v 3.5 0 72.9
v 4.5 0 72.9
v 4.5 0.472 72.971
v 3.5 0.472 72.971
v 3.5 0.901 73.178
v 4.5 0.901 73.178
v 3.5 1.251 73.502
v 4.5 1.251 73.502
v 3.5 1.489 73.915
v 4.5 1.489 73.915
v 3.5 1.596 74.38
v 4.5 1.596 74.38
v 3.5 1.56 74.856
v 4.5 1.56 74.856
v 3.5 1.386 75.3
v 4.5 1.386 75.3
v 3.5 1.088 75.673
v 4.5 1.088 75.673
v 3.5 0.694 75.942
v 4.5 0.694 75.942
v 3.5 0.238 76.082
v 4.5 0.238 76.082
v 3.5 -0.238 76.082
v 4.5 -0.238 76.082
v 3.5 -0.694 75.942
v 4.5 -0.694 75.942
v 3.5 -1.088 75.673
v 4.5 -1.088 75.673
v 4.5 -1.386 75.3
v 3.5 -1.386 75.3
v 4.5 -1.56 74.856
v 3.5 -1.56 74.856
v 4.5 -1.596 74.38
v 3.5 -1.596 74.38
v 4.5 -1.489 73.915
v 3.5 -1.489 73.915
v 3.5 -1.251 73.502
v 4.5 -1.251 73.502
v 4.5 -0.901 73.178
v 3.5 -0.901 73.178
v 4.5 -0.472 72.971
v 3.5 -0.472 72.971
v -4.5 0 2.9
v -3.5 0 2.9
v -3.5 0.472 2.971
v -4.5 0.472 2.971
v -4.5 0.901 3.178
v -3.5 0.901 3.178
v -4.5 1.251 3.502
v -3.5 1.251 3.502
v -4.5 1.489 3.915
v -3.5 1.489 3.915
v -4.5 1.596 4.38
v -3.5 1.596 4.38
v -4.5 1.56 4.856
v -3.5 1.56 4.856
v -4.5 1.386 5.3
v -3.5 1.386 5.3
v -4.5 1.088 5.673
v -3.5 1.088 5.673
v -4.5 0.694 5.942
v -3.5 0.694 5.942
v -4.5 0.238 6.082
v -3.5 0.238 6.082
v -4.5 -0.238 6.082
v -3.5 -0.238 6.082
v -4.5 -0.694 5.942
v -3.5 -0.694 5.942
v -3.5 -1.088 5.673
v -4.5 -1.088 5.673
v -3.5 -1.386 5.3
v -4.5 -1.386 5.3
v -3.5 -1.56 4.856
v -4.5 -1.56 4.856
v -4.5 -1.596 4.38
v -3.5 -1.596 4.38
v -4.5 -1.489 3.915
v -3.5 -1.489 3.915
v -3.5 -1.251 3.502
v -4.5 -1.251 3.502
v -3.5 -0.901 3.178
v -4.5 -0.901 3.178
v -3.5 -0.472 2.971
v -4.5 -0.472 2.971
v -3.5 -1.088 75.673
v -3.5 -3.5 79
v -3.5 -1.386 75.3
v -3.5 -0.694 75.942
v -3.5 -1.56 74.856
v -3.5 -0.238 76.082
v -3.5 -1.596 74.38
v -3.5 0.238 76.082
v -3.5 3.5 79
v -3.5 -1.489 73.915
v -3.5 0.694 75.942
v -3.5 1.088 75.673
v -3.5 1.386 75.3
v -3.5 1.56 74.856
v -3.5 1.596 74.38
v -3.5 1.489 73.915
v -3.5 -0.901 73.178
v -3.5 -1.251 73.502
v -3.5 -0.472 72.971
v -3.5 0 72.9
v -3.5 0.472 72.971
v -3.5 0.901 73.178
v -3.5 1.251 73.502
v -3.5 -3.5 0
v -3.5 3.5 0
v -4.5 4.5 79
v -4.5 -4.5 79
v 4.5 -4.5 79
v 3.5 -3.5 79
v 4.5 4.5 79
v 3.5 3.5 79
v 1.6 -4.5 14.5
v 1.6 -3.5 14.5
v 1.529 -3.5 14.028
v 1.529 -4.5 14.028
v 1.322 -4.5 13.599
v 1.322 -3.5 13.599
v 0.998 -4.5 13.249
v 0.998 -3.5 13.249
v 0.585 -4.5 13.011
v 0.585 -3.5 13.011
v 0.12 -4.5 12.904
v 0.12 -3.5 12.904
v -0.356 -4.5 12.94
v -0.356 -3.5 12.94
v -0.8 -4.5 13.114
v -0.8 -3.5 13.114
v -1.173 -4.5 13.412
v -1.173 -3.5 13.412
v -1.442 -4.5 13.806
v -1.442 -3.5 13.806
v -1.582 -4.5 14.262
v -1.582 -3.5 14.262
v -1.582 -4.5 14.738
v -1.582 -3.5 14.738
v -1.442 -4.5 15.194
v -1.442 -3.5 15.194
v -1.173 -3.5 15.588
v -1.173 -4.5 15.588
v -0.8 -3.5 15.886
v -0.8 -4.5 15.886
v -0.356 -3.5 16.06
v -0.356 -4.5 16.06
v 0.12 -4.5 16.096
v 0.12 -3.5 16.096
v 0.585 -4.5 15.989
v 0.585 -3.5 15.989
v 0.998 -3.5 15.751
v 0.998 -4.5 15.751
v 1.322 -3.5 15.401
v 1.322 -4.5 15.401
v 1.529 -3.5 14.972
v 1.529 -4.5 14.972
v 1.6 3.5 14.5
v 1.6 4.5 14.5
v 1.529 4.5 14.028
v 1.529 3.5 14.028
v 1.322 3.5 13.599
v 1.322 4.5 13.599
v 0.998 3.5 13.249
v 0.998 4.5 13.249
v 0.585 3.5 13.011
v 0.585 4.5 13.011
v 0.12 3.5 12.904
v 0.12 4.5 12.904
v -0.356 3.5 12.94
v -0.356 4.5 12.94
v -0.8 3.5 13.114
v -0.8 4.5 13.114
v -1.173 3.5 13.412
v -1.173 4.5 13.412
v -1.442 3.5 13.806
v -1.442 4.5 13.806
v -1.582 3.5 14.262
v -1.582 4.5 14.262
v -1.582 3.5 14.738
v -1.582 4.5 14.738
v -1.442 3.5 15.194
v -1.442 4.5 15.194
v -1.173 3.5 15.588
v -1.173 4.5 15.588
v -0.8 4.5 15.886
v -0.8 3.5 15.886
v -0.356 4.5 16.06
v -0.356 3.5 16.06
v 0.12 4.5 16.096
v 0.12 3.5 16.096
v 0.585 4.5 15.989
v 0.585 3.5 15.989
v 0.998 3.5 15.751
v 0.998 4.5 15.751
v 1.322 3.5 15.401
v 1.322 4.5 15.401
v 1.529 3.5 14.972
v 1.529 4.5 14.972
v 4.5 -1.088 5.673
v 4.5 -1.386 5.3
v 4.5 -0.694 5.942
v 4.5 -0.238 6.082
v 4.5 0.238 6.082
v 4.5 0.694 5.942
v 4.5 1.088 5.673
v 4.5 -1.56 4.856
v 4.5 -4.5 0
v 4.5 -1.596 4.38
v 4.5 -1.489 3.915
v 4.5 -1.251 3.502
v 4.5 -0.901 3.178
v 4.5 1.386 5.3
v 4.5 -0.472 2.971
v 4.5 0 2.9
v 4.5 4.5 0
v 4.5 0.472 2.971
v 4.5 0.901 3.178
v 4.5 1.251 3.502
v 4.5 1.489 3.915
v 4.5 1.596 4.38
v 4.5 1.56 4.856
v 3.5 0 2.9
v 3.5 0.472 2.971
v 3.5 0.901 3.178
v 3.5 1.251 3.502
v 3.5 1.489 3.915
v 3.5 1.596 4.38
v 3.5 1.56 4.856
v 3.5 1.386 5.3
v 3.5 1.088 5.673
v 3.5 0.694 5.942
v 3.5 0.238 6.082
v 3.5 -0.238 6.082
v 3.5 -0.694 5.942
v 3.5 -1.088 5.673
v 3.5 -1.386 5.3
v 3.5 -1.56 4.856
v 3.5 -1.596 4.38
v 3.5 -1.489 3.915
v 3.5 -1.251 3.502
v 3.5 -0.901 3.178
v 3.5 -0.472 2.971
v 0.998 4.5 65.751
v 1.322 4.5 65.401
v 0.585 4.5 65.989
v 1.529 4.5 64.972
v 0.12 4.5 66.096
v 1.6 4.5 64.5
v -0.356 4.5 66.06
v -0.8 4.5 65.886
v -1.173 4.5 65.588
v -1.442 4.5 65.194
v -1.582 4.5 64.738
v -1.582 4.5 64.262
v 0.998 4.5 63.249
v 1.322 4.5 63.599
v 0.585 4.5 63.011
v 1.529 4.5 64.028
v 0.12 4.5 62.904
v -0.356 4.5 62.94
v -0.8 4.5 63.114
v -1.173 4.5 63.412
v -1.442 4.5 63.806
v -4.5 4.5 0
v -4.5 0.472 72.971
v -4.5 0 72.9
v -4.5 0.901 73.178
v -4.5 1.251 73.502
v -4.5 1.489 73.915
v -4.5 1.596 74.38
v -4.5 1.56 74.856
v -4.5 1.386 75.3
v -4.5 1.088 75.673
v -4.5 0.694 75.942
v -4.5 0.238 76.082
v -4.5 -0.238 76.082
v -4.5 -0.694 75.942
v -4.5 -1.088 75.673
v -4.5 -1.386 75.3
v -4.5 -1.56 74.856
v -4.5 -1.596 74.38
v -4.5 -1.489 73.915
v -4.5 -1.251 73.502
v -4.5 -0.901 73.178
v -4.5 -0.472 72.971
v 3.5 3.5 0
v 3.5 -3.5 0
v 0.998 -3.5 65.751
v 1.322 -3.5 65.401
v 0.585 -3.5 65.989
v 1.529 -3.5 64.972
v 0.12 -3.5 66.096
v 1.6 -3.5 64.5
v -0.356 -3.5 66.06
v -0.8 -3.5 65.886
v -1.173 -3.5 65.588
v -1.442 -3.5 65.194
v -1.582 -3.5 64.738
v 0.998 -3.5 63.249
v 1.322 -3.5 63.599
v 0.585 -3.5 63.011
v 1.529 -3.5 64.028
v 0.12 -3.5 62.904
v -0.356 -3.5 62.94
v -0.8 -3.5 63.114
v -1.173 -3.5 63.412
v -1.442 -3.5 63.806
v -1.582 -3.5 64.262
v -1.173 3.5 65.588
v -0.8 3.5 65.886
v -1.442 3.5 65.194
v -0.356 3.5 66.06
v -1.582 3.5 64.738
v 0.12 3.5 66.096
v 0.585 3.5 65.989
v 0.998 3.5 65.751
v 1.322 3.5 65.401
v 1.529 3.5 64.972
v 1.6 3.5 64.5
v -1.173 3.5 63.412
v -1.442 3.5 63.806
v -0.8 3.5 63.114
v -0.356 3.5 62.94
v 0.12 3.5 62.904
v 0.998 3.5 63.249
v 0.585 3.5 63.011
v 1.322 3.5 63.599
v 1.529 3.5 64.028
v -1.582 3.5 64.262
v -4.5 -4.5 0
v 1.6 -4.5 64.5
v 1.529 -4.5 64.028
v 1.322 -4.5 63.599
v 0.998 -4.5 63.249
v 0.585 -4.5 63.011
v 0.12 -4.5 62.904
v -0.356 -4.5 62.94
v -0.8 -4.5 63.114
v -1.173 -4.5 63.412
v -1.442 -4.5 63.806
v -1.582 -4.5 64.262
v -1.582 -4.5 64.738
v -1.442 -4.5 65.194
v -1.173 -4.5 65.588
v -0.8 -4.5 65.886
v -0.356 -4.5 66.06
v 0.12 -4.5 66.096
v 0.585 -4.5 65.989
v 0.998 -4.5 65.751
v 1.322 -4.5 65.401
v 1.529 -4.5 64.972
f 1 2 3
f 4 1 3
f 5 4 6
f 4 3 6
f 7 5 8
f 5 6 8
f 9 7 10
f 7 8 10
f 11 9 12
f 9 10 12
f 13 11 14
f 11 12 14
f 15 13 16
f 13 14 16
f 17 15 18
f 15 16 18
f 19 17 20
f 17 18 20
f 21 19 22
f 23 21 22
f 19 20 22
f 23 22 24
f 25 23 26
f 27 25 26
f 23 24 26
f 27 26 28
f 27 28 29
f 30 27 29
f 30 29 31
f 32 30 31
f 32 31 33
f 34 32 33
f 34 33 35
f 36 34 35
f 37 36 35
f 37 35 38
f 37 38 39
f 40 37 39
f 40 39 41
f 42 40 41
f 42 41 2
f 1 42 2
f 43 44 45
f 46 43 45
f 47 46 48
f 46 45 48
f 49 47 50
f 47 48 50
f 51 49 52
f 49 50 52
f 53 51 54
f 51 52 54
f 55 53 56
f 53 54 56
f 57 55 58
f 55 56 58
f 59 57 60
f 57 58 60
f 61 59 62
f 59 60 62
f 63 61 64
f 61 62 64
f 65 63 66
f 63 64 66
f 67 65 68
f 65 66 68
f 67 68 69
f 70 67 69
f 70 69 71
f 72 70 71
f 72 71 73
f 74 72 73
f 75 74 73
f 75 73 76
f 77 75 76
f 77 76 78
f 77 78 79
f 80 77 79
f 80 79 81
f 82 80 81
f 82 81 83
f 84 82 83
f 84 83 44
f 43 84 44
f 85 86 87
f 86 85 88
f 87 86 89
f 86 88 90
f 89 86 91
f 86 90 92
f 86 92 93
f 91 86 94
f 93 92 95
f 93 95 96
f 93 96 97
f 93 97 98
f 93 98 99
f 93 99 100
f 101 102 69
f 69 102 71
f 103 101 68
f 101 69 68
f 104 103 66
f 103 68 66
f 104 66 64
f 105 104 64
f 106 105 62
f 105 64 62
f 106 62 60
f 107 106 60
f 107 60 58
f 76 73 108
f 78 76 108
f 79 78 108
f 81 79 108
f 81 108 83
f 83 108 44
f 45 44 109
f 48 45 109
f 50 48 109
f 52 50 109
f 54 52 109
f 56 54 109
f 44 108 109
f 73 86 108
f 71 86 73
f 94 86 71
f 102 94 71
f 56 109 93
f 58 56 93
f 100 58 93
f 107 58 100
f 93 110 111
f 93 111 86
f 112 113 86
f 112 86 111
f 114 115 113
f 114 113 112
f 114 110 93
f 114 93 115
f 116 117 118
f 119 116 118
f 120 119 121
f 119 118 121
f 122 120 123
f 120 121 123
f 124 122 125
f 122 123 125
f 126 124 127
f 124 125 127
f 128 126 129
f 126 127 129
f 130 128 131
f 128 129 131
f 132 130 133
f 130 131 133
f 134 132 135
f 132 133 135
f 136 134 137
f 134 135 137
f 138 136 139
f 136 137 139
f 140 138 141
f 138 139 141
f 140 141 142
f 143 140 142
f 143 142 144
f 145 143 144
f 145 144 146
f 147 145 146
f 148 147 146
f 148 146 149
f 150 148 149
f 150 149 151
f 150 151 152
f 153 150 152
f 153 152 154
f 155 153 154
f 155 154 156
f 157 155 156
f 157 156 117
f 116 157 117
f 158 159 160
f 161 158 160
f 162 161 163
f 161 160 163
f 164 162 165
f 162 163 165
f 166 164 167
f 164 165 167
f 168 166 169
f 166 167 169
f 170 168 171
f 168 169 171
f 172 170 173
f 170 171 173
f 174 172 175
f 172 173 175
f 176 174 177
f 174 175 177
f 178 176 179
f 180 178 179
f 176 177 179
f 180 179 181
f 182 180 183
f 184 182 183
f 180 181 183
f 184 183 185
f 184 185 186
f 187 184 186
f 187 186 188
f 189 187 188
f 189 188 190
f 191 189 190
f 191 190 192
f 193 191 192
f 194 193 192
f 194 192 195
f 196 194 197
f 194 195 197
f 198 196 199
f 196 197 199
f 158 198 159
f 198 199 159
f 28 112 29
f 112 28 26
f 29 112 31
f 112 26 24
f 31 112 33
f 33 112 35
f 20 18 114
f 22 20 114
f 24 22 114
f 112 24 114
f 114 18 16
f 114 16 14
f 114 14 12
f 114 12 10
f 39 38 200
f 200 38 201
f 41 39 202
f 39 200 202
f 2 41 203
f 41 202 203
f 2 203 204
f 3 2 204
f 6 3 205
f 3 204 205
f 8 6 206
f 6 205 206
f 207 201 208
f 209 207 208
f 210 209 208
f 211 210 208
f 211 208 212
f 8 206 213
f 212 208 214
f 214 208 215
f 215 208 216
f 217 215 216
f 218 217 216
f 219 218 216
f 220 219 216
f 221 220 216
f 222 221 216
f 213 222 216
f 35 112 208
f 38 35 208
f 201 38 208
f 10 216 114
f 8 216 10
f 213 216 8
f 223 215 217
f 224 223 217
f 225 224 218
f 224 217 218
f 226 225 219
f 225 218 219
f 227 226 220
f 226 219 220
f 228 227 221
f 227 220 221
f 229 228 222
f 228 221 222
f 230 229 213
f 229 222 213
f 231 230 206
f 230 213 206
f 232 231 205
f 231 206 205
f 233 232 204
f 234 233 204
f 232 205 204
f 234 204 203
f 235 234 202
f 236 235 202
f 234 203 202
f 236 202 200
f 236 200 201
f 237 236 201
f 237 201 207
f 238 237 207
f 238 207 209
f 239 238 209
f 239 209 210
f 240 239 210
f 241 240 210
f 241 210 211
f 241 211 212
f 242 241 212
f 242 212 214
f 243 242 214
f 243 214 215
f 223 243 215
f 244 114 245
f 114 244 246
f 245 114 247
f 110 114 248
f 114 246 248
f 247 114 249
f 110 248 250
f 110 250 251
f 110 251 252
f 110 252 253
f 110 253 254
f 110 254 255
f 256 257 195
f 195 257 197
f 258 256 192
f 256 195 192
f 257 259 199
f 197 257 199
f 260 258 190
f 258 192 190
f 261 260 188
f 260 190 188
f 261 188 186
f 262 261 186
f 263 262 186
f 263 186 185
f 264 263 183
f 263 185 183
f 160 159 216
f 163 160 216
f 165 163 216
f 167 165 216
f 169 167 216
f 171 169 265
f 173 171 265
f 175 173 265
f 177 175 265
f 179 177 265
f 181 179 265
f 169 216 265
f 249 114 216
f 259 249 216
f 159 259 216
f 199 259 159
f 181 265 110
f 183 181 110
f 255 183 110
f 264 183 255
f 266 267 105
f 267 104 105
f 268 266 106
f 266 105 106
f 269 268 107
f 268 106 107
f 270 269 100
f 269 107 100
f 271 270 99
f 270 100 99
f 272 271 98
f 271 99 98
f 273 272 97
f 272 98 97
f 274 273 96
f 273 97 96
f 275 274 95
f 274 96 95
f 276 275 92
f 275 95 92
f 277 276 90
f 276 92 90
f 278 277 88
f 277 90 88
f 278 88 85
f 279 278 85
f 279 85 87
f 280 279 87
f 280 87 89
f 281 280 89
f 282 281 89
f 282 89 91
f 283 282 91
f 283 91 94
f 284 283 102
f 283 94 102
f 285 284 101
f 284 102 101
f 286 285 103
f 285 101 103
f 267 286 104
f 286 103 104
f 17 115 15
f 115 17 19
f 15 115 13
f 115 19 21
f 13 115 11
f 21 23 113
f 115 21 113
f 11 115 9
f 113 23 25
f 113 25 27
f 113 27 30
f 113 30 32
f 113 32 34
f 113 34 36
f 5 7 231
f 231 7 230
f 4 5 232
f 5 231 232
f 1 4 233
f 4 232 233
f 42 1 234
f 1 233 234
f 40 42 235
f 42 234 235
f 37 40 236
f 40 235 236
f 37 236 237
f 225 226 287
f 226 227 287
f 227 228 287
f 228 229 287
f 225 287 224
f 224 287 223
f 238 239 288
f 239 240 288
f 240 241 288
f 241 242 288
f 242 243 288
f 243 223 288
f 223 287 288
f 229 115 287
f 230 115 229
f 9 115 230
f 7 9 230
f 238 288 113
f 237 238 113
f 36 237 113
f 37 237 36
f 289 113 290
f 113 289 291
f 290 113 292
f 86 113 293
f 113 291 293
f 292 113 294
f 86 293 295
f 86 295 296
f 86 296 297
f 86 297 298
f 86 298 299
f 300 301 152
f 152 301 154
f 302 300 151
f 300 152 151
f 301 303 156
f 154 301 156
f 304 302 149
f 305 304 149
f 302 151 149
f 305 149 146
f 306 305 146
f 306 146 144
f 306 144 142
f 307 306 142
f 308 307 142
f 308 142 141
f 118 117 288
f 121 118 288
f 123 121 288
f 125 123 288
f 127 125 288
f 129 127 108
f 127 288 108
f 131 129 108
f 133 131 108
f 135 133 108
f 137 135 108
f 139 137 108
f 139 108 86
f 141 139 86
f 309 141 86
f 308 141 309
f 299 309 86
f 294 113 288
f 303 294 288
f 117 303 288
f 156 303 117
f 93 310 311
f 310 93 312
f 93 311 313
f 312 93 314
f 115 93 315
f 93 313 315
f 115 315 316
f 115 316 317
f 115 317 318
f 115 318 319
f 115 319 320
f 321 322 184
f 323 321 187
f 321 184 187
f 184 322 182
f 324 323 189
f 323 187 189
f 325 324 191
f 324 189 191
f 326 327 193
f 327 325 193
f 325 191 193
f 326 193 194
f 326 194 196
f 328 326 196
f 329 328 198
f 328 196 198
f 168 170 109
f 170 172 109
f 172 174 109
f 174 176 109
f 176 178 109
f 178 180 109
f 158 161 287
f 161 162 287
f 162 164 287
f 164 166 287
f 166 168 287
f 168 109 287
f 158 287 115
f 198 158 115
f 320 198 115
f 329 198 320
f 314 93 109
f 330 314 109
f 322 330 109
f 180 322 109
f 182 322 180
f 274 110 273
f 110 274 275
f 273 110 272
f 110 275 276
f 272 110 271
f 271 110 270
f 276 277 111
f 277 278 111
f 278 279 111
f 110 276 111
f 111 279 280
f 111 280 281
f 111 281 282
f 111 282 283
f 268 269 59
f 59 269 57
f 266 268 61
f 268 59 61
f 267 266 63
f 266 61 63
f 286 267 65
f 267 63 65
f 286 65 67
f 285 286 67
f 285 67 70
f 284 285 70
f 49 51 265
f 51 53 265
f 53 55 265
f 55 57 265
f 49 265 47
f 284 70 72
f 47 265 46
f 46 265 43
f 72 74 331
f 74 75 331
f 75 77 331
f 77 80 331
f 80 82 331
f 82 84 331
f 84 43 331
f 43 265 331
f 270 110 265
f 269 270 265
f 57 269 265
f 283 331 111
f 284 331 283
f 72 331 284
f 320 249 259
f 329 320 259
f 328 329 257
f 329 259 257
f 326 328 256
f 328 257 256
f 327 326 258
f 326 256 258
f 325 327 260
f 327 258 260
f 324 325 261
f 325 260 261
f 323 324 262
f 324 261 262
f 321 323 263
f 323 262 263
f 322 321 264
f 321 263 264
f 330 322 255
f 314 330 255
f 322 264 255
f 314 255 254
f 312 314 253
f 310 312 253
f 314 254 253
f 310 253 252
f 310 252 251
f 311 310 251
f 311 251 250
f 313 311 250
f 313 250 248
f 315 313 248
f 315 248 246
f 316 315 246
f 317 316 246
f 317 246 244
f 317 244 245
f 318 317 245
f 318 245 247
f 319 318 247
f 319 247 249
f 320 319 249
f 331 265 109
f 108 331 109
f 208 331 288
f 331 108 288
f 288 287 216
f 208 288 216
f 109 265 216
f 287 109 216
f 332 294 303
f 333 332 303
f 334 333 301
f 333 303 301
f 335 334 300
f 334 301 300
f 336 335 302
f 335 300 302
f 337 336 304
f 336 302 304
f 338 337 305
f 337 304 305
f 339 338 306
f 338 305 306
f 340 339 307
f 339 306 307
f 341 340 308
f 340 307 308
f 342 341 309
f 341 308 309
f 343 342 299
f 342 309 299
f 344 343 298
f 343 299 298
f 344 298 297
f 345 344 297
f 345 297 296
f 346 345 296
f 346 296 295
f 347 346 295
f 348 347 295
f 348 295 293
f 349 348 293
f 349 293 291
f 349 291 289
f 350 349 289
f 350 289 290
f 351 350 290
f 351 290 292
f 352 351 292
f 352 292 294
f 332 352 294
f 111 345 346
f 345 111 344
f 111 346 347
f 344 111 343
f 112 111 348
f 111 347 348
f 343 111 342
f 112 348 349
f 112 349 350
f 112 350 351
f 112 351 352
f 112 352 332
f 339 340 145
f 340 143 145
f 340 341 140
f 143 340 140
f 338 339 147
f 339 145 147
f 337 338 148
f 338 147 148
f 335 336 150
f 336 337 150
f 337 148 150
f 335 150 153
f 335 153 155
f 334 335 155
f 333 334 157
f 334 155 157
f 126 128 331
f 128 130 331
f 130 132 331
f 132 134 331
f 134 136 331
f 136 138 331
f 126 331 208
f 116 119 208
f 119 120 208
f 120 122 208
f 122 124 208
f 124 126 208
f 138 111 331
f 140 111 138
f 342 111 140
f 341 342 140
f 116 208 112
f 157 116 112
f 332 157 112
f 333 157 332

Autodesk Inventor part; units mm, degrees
ref_plane "YZ Plane" through (0, 0, 0) normal (1, 0, 0) x (0, 1, 0)
ref_plane "XZ Plane" through (0, 0, 0) normal (0, 1, 0) x (-1, 0, 0)
ref_plane "XY Plane" through (0, 0, 0) normal (0, 0, 1) x (1, 0, 0)
sketch "スケッチ1" plane through (0, 0, 0) normal (0, 0, 1) x (1, 0, 0)
  line L0 (4.5, 4.5) -> (-4.5, 4.5)
  line L1 (-4.5, 4.5) -> (-4.5, -4.5)
  line L2 (-4.5, -4.5) -> (4.5, -4.5)
  line L3 (4.5, -4.5) -> (4.5, 4.5)
  line L4 (4.5, 4.5) -> (-4.5, -4.5) construction
  line L5 (-4.5, 4.5) -> (4.5, -4.5) construction
  line L6 (-3.5, 3.5) -> (3.5, 3.5)
  line L7 (3.5, 3.5) -> (3.5, -3.5)
  line L8 (3.5, -3.5) -> (-3.5, -3.5)
  line L9 (-3.5, -3.5) -> (-3.5, 3.5)
  point P0 (0, 0)
  dimension "d0" = 9
  dimension "d1" = 9
  dimension "d2" = 1
extrude "押し出し1" add sketch "スケッチ1" along normal blind 79
sketch "スケッチ2" plane through (4.5, -4.5, 0) normal (1, 0, 0) x (0, 0, -1)
  circle A0 centre (-4.5, 4.5) radius 1.6
  circle A1 centre (-74.5, 4.5) radius 1.6
  line L0 (0, 0) -> (0, 9) projected
  point P0 (0, 4.5)
  point P1 (0, 4.5)
  dimension "d5" = 3.2
  dimension "d6" = 3.2
  dimension "d7" = 4.5
  dimension "d8" = 70
extrude "押し出し2" cut sketch "スケッチ2" against normal through all
sketch "スケッチ3" plane through (-4.5, 4.5, 0) normal (0, 1, 0) x (1, 0, 0)
  circle A0 centre (4.5, -14.5) radius 1.6
  circle A1 centre (4.5, -64.5) radius 1.6
  line L0 (9, 0) -> (0, 0) projected
  point P0 (4.5, 0)
  point P1 (4.5, 0)
  dimension "d11" = 3.2
  dimension "d12" = 3.2
  dimension "d13" = 50
  dimension "d14" = 14.5
extrude "押し出し3" cut sketch "スケッチ3" against normal through all
properties part number "ハンド_角柱2" material "アルミニウム 6061"
